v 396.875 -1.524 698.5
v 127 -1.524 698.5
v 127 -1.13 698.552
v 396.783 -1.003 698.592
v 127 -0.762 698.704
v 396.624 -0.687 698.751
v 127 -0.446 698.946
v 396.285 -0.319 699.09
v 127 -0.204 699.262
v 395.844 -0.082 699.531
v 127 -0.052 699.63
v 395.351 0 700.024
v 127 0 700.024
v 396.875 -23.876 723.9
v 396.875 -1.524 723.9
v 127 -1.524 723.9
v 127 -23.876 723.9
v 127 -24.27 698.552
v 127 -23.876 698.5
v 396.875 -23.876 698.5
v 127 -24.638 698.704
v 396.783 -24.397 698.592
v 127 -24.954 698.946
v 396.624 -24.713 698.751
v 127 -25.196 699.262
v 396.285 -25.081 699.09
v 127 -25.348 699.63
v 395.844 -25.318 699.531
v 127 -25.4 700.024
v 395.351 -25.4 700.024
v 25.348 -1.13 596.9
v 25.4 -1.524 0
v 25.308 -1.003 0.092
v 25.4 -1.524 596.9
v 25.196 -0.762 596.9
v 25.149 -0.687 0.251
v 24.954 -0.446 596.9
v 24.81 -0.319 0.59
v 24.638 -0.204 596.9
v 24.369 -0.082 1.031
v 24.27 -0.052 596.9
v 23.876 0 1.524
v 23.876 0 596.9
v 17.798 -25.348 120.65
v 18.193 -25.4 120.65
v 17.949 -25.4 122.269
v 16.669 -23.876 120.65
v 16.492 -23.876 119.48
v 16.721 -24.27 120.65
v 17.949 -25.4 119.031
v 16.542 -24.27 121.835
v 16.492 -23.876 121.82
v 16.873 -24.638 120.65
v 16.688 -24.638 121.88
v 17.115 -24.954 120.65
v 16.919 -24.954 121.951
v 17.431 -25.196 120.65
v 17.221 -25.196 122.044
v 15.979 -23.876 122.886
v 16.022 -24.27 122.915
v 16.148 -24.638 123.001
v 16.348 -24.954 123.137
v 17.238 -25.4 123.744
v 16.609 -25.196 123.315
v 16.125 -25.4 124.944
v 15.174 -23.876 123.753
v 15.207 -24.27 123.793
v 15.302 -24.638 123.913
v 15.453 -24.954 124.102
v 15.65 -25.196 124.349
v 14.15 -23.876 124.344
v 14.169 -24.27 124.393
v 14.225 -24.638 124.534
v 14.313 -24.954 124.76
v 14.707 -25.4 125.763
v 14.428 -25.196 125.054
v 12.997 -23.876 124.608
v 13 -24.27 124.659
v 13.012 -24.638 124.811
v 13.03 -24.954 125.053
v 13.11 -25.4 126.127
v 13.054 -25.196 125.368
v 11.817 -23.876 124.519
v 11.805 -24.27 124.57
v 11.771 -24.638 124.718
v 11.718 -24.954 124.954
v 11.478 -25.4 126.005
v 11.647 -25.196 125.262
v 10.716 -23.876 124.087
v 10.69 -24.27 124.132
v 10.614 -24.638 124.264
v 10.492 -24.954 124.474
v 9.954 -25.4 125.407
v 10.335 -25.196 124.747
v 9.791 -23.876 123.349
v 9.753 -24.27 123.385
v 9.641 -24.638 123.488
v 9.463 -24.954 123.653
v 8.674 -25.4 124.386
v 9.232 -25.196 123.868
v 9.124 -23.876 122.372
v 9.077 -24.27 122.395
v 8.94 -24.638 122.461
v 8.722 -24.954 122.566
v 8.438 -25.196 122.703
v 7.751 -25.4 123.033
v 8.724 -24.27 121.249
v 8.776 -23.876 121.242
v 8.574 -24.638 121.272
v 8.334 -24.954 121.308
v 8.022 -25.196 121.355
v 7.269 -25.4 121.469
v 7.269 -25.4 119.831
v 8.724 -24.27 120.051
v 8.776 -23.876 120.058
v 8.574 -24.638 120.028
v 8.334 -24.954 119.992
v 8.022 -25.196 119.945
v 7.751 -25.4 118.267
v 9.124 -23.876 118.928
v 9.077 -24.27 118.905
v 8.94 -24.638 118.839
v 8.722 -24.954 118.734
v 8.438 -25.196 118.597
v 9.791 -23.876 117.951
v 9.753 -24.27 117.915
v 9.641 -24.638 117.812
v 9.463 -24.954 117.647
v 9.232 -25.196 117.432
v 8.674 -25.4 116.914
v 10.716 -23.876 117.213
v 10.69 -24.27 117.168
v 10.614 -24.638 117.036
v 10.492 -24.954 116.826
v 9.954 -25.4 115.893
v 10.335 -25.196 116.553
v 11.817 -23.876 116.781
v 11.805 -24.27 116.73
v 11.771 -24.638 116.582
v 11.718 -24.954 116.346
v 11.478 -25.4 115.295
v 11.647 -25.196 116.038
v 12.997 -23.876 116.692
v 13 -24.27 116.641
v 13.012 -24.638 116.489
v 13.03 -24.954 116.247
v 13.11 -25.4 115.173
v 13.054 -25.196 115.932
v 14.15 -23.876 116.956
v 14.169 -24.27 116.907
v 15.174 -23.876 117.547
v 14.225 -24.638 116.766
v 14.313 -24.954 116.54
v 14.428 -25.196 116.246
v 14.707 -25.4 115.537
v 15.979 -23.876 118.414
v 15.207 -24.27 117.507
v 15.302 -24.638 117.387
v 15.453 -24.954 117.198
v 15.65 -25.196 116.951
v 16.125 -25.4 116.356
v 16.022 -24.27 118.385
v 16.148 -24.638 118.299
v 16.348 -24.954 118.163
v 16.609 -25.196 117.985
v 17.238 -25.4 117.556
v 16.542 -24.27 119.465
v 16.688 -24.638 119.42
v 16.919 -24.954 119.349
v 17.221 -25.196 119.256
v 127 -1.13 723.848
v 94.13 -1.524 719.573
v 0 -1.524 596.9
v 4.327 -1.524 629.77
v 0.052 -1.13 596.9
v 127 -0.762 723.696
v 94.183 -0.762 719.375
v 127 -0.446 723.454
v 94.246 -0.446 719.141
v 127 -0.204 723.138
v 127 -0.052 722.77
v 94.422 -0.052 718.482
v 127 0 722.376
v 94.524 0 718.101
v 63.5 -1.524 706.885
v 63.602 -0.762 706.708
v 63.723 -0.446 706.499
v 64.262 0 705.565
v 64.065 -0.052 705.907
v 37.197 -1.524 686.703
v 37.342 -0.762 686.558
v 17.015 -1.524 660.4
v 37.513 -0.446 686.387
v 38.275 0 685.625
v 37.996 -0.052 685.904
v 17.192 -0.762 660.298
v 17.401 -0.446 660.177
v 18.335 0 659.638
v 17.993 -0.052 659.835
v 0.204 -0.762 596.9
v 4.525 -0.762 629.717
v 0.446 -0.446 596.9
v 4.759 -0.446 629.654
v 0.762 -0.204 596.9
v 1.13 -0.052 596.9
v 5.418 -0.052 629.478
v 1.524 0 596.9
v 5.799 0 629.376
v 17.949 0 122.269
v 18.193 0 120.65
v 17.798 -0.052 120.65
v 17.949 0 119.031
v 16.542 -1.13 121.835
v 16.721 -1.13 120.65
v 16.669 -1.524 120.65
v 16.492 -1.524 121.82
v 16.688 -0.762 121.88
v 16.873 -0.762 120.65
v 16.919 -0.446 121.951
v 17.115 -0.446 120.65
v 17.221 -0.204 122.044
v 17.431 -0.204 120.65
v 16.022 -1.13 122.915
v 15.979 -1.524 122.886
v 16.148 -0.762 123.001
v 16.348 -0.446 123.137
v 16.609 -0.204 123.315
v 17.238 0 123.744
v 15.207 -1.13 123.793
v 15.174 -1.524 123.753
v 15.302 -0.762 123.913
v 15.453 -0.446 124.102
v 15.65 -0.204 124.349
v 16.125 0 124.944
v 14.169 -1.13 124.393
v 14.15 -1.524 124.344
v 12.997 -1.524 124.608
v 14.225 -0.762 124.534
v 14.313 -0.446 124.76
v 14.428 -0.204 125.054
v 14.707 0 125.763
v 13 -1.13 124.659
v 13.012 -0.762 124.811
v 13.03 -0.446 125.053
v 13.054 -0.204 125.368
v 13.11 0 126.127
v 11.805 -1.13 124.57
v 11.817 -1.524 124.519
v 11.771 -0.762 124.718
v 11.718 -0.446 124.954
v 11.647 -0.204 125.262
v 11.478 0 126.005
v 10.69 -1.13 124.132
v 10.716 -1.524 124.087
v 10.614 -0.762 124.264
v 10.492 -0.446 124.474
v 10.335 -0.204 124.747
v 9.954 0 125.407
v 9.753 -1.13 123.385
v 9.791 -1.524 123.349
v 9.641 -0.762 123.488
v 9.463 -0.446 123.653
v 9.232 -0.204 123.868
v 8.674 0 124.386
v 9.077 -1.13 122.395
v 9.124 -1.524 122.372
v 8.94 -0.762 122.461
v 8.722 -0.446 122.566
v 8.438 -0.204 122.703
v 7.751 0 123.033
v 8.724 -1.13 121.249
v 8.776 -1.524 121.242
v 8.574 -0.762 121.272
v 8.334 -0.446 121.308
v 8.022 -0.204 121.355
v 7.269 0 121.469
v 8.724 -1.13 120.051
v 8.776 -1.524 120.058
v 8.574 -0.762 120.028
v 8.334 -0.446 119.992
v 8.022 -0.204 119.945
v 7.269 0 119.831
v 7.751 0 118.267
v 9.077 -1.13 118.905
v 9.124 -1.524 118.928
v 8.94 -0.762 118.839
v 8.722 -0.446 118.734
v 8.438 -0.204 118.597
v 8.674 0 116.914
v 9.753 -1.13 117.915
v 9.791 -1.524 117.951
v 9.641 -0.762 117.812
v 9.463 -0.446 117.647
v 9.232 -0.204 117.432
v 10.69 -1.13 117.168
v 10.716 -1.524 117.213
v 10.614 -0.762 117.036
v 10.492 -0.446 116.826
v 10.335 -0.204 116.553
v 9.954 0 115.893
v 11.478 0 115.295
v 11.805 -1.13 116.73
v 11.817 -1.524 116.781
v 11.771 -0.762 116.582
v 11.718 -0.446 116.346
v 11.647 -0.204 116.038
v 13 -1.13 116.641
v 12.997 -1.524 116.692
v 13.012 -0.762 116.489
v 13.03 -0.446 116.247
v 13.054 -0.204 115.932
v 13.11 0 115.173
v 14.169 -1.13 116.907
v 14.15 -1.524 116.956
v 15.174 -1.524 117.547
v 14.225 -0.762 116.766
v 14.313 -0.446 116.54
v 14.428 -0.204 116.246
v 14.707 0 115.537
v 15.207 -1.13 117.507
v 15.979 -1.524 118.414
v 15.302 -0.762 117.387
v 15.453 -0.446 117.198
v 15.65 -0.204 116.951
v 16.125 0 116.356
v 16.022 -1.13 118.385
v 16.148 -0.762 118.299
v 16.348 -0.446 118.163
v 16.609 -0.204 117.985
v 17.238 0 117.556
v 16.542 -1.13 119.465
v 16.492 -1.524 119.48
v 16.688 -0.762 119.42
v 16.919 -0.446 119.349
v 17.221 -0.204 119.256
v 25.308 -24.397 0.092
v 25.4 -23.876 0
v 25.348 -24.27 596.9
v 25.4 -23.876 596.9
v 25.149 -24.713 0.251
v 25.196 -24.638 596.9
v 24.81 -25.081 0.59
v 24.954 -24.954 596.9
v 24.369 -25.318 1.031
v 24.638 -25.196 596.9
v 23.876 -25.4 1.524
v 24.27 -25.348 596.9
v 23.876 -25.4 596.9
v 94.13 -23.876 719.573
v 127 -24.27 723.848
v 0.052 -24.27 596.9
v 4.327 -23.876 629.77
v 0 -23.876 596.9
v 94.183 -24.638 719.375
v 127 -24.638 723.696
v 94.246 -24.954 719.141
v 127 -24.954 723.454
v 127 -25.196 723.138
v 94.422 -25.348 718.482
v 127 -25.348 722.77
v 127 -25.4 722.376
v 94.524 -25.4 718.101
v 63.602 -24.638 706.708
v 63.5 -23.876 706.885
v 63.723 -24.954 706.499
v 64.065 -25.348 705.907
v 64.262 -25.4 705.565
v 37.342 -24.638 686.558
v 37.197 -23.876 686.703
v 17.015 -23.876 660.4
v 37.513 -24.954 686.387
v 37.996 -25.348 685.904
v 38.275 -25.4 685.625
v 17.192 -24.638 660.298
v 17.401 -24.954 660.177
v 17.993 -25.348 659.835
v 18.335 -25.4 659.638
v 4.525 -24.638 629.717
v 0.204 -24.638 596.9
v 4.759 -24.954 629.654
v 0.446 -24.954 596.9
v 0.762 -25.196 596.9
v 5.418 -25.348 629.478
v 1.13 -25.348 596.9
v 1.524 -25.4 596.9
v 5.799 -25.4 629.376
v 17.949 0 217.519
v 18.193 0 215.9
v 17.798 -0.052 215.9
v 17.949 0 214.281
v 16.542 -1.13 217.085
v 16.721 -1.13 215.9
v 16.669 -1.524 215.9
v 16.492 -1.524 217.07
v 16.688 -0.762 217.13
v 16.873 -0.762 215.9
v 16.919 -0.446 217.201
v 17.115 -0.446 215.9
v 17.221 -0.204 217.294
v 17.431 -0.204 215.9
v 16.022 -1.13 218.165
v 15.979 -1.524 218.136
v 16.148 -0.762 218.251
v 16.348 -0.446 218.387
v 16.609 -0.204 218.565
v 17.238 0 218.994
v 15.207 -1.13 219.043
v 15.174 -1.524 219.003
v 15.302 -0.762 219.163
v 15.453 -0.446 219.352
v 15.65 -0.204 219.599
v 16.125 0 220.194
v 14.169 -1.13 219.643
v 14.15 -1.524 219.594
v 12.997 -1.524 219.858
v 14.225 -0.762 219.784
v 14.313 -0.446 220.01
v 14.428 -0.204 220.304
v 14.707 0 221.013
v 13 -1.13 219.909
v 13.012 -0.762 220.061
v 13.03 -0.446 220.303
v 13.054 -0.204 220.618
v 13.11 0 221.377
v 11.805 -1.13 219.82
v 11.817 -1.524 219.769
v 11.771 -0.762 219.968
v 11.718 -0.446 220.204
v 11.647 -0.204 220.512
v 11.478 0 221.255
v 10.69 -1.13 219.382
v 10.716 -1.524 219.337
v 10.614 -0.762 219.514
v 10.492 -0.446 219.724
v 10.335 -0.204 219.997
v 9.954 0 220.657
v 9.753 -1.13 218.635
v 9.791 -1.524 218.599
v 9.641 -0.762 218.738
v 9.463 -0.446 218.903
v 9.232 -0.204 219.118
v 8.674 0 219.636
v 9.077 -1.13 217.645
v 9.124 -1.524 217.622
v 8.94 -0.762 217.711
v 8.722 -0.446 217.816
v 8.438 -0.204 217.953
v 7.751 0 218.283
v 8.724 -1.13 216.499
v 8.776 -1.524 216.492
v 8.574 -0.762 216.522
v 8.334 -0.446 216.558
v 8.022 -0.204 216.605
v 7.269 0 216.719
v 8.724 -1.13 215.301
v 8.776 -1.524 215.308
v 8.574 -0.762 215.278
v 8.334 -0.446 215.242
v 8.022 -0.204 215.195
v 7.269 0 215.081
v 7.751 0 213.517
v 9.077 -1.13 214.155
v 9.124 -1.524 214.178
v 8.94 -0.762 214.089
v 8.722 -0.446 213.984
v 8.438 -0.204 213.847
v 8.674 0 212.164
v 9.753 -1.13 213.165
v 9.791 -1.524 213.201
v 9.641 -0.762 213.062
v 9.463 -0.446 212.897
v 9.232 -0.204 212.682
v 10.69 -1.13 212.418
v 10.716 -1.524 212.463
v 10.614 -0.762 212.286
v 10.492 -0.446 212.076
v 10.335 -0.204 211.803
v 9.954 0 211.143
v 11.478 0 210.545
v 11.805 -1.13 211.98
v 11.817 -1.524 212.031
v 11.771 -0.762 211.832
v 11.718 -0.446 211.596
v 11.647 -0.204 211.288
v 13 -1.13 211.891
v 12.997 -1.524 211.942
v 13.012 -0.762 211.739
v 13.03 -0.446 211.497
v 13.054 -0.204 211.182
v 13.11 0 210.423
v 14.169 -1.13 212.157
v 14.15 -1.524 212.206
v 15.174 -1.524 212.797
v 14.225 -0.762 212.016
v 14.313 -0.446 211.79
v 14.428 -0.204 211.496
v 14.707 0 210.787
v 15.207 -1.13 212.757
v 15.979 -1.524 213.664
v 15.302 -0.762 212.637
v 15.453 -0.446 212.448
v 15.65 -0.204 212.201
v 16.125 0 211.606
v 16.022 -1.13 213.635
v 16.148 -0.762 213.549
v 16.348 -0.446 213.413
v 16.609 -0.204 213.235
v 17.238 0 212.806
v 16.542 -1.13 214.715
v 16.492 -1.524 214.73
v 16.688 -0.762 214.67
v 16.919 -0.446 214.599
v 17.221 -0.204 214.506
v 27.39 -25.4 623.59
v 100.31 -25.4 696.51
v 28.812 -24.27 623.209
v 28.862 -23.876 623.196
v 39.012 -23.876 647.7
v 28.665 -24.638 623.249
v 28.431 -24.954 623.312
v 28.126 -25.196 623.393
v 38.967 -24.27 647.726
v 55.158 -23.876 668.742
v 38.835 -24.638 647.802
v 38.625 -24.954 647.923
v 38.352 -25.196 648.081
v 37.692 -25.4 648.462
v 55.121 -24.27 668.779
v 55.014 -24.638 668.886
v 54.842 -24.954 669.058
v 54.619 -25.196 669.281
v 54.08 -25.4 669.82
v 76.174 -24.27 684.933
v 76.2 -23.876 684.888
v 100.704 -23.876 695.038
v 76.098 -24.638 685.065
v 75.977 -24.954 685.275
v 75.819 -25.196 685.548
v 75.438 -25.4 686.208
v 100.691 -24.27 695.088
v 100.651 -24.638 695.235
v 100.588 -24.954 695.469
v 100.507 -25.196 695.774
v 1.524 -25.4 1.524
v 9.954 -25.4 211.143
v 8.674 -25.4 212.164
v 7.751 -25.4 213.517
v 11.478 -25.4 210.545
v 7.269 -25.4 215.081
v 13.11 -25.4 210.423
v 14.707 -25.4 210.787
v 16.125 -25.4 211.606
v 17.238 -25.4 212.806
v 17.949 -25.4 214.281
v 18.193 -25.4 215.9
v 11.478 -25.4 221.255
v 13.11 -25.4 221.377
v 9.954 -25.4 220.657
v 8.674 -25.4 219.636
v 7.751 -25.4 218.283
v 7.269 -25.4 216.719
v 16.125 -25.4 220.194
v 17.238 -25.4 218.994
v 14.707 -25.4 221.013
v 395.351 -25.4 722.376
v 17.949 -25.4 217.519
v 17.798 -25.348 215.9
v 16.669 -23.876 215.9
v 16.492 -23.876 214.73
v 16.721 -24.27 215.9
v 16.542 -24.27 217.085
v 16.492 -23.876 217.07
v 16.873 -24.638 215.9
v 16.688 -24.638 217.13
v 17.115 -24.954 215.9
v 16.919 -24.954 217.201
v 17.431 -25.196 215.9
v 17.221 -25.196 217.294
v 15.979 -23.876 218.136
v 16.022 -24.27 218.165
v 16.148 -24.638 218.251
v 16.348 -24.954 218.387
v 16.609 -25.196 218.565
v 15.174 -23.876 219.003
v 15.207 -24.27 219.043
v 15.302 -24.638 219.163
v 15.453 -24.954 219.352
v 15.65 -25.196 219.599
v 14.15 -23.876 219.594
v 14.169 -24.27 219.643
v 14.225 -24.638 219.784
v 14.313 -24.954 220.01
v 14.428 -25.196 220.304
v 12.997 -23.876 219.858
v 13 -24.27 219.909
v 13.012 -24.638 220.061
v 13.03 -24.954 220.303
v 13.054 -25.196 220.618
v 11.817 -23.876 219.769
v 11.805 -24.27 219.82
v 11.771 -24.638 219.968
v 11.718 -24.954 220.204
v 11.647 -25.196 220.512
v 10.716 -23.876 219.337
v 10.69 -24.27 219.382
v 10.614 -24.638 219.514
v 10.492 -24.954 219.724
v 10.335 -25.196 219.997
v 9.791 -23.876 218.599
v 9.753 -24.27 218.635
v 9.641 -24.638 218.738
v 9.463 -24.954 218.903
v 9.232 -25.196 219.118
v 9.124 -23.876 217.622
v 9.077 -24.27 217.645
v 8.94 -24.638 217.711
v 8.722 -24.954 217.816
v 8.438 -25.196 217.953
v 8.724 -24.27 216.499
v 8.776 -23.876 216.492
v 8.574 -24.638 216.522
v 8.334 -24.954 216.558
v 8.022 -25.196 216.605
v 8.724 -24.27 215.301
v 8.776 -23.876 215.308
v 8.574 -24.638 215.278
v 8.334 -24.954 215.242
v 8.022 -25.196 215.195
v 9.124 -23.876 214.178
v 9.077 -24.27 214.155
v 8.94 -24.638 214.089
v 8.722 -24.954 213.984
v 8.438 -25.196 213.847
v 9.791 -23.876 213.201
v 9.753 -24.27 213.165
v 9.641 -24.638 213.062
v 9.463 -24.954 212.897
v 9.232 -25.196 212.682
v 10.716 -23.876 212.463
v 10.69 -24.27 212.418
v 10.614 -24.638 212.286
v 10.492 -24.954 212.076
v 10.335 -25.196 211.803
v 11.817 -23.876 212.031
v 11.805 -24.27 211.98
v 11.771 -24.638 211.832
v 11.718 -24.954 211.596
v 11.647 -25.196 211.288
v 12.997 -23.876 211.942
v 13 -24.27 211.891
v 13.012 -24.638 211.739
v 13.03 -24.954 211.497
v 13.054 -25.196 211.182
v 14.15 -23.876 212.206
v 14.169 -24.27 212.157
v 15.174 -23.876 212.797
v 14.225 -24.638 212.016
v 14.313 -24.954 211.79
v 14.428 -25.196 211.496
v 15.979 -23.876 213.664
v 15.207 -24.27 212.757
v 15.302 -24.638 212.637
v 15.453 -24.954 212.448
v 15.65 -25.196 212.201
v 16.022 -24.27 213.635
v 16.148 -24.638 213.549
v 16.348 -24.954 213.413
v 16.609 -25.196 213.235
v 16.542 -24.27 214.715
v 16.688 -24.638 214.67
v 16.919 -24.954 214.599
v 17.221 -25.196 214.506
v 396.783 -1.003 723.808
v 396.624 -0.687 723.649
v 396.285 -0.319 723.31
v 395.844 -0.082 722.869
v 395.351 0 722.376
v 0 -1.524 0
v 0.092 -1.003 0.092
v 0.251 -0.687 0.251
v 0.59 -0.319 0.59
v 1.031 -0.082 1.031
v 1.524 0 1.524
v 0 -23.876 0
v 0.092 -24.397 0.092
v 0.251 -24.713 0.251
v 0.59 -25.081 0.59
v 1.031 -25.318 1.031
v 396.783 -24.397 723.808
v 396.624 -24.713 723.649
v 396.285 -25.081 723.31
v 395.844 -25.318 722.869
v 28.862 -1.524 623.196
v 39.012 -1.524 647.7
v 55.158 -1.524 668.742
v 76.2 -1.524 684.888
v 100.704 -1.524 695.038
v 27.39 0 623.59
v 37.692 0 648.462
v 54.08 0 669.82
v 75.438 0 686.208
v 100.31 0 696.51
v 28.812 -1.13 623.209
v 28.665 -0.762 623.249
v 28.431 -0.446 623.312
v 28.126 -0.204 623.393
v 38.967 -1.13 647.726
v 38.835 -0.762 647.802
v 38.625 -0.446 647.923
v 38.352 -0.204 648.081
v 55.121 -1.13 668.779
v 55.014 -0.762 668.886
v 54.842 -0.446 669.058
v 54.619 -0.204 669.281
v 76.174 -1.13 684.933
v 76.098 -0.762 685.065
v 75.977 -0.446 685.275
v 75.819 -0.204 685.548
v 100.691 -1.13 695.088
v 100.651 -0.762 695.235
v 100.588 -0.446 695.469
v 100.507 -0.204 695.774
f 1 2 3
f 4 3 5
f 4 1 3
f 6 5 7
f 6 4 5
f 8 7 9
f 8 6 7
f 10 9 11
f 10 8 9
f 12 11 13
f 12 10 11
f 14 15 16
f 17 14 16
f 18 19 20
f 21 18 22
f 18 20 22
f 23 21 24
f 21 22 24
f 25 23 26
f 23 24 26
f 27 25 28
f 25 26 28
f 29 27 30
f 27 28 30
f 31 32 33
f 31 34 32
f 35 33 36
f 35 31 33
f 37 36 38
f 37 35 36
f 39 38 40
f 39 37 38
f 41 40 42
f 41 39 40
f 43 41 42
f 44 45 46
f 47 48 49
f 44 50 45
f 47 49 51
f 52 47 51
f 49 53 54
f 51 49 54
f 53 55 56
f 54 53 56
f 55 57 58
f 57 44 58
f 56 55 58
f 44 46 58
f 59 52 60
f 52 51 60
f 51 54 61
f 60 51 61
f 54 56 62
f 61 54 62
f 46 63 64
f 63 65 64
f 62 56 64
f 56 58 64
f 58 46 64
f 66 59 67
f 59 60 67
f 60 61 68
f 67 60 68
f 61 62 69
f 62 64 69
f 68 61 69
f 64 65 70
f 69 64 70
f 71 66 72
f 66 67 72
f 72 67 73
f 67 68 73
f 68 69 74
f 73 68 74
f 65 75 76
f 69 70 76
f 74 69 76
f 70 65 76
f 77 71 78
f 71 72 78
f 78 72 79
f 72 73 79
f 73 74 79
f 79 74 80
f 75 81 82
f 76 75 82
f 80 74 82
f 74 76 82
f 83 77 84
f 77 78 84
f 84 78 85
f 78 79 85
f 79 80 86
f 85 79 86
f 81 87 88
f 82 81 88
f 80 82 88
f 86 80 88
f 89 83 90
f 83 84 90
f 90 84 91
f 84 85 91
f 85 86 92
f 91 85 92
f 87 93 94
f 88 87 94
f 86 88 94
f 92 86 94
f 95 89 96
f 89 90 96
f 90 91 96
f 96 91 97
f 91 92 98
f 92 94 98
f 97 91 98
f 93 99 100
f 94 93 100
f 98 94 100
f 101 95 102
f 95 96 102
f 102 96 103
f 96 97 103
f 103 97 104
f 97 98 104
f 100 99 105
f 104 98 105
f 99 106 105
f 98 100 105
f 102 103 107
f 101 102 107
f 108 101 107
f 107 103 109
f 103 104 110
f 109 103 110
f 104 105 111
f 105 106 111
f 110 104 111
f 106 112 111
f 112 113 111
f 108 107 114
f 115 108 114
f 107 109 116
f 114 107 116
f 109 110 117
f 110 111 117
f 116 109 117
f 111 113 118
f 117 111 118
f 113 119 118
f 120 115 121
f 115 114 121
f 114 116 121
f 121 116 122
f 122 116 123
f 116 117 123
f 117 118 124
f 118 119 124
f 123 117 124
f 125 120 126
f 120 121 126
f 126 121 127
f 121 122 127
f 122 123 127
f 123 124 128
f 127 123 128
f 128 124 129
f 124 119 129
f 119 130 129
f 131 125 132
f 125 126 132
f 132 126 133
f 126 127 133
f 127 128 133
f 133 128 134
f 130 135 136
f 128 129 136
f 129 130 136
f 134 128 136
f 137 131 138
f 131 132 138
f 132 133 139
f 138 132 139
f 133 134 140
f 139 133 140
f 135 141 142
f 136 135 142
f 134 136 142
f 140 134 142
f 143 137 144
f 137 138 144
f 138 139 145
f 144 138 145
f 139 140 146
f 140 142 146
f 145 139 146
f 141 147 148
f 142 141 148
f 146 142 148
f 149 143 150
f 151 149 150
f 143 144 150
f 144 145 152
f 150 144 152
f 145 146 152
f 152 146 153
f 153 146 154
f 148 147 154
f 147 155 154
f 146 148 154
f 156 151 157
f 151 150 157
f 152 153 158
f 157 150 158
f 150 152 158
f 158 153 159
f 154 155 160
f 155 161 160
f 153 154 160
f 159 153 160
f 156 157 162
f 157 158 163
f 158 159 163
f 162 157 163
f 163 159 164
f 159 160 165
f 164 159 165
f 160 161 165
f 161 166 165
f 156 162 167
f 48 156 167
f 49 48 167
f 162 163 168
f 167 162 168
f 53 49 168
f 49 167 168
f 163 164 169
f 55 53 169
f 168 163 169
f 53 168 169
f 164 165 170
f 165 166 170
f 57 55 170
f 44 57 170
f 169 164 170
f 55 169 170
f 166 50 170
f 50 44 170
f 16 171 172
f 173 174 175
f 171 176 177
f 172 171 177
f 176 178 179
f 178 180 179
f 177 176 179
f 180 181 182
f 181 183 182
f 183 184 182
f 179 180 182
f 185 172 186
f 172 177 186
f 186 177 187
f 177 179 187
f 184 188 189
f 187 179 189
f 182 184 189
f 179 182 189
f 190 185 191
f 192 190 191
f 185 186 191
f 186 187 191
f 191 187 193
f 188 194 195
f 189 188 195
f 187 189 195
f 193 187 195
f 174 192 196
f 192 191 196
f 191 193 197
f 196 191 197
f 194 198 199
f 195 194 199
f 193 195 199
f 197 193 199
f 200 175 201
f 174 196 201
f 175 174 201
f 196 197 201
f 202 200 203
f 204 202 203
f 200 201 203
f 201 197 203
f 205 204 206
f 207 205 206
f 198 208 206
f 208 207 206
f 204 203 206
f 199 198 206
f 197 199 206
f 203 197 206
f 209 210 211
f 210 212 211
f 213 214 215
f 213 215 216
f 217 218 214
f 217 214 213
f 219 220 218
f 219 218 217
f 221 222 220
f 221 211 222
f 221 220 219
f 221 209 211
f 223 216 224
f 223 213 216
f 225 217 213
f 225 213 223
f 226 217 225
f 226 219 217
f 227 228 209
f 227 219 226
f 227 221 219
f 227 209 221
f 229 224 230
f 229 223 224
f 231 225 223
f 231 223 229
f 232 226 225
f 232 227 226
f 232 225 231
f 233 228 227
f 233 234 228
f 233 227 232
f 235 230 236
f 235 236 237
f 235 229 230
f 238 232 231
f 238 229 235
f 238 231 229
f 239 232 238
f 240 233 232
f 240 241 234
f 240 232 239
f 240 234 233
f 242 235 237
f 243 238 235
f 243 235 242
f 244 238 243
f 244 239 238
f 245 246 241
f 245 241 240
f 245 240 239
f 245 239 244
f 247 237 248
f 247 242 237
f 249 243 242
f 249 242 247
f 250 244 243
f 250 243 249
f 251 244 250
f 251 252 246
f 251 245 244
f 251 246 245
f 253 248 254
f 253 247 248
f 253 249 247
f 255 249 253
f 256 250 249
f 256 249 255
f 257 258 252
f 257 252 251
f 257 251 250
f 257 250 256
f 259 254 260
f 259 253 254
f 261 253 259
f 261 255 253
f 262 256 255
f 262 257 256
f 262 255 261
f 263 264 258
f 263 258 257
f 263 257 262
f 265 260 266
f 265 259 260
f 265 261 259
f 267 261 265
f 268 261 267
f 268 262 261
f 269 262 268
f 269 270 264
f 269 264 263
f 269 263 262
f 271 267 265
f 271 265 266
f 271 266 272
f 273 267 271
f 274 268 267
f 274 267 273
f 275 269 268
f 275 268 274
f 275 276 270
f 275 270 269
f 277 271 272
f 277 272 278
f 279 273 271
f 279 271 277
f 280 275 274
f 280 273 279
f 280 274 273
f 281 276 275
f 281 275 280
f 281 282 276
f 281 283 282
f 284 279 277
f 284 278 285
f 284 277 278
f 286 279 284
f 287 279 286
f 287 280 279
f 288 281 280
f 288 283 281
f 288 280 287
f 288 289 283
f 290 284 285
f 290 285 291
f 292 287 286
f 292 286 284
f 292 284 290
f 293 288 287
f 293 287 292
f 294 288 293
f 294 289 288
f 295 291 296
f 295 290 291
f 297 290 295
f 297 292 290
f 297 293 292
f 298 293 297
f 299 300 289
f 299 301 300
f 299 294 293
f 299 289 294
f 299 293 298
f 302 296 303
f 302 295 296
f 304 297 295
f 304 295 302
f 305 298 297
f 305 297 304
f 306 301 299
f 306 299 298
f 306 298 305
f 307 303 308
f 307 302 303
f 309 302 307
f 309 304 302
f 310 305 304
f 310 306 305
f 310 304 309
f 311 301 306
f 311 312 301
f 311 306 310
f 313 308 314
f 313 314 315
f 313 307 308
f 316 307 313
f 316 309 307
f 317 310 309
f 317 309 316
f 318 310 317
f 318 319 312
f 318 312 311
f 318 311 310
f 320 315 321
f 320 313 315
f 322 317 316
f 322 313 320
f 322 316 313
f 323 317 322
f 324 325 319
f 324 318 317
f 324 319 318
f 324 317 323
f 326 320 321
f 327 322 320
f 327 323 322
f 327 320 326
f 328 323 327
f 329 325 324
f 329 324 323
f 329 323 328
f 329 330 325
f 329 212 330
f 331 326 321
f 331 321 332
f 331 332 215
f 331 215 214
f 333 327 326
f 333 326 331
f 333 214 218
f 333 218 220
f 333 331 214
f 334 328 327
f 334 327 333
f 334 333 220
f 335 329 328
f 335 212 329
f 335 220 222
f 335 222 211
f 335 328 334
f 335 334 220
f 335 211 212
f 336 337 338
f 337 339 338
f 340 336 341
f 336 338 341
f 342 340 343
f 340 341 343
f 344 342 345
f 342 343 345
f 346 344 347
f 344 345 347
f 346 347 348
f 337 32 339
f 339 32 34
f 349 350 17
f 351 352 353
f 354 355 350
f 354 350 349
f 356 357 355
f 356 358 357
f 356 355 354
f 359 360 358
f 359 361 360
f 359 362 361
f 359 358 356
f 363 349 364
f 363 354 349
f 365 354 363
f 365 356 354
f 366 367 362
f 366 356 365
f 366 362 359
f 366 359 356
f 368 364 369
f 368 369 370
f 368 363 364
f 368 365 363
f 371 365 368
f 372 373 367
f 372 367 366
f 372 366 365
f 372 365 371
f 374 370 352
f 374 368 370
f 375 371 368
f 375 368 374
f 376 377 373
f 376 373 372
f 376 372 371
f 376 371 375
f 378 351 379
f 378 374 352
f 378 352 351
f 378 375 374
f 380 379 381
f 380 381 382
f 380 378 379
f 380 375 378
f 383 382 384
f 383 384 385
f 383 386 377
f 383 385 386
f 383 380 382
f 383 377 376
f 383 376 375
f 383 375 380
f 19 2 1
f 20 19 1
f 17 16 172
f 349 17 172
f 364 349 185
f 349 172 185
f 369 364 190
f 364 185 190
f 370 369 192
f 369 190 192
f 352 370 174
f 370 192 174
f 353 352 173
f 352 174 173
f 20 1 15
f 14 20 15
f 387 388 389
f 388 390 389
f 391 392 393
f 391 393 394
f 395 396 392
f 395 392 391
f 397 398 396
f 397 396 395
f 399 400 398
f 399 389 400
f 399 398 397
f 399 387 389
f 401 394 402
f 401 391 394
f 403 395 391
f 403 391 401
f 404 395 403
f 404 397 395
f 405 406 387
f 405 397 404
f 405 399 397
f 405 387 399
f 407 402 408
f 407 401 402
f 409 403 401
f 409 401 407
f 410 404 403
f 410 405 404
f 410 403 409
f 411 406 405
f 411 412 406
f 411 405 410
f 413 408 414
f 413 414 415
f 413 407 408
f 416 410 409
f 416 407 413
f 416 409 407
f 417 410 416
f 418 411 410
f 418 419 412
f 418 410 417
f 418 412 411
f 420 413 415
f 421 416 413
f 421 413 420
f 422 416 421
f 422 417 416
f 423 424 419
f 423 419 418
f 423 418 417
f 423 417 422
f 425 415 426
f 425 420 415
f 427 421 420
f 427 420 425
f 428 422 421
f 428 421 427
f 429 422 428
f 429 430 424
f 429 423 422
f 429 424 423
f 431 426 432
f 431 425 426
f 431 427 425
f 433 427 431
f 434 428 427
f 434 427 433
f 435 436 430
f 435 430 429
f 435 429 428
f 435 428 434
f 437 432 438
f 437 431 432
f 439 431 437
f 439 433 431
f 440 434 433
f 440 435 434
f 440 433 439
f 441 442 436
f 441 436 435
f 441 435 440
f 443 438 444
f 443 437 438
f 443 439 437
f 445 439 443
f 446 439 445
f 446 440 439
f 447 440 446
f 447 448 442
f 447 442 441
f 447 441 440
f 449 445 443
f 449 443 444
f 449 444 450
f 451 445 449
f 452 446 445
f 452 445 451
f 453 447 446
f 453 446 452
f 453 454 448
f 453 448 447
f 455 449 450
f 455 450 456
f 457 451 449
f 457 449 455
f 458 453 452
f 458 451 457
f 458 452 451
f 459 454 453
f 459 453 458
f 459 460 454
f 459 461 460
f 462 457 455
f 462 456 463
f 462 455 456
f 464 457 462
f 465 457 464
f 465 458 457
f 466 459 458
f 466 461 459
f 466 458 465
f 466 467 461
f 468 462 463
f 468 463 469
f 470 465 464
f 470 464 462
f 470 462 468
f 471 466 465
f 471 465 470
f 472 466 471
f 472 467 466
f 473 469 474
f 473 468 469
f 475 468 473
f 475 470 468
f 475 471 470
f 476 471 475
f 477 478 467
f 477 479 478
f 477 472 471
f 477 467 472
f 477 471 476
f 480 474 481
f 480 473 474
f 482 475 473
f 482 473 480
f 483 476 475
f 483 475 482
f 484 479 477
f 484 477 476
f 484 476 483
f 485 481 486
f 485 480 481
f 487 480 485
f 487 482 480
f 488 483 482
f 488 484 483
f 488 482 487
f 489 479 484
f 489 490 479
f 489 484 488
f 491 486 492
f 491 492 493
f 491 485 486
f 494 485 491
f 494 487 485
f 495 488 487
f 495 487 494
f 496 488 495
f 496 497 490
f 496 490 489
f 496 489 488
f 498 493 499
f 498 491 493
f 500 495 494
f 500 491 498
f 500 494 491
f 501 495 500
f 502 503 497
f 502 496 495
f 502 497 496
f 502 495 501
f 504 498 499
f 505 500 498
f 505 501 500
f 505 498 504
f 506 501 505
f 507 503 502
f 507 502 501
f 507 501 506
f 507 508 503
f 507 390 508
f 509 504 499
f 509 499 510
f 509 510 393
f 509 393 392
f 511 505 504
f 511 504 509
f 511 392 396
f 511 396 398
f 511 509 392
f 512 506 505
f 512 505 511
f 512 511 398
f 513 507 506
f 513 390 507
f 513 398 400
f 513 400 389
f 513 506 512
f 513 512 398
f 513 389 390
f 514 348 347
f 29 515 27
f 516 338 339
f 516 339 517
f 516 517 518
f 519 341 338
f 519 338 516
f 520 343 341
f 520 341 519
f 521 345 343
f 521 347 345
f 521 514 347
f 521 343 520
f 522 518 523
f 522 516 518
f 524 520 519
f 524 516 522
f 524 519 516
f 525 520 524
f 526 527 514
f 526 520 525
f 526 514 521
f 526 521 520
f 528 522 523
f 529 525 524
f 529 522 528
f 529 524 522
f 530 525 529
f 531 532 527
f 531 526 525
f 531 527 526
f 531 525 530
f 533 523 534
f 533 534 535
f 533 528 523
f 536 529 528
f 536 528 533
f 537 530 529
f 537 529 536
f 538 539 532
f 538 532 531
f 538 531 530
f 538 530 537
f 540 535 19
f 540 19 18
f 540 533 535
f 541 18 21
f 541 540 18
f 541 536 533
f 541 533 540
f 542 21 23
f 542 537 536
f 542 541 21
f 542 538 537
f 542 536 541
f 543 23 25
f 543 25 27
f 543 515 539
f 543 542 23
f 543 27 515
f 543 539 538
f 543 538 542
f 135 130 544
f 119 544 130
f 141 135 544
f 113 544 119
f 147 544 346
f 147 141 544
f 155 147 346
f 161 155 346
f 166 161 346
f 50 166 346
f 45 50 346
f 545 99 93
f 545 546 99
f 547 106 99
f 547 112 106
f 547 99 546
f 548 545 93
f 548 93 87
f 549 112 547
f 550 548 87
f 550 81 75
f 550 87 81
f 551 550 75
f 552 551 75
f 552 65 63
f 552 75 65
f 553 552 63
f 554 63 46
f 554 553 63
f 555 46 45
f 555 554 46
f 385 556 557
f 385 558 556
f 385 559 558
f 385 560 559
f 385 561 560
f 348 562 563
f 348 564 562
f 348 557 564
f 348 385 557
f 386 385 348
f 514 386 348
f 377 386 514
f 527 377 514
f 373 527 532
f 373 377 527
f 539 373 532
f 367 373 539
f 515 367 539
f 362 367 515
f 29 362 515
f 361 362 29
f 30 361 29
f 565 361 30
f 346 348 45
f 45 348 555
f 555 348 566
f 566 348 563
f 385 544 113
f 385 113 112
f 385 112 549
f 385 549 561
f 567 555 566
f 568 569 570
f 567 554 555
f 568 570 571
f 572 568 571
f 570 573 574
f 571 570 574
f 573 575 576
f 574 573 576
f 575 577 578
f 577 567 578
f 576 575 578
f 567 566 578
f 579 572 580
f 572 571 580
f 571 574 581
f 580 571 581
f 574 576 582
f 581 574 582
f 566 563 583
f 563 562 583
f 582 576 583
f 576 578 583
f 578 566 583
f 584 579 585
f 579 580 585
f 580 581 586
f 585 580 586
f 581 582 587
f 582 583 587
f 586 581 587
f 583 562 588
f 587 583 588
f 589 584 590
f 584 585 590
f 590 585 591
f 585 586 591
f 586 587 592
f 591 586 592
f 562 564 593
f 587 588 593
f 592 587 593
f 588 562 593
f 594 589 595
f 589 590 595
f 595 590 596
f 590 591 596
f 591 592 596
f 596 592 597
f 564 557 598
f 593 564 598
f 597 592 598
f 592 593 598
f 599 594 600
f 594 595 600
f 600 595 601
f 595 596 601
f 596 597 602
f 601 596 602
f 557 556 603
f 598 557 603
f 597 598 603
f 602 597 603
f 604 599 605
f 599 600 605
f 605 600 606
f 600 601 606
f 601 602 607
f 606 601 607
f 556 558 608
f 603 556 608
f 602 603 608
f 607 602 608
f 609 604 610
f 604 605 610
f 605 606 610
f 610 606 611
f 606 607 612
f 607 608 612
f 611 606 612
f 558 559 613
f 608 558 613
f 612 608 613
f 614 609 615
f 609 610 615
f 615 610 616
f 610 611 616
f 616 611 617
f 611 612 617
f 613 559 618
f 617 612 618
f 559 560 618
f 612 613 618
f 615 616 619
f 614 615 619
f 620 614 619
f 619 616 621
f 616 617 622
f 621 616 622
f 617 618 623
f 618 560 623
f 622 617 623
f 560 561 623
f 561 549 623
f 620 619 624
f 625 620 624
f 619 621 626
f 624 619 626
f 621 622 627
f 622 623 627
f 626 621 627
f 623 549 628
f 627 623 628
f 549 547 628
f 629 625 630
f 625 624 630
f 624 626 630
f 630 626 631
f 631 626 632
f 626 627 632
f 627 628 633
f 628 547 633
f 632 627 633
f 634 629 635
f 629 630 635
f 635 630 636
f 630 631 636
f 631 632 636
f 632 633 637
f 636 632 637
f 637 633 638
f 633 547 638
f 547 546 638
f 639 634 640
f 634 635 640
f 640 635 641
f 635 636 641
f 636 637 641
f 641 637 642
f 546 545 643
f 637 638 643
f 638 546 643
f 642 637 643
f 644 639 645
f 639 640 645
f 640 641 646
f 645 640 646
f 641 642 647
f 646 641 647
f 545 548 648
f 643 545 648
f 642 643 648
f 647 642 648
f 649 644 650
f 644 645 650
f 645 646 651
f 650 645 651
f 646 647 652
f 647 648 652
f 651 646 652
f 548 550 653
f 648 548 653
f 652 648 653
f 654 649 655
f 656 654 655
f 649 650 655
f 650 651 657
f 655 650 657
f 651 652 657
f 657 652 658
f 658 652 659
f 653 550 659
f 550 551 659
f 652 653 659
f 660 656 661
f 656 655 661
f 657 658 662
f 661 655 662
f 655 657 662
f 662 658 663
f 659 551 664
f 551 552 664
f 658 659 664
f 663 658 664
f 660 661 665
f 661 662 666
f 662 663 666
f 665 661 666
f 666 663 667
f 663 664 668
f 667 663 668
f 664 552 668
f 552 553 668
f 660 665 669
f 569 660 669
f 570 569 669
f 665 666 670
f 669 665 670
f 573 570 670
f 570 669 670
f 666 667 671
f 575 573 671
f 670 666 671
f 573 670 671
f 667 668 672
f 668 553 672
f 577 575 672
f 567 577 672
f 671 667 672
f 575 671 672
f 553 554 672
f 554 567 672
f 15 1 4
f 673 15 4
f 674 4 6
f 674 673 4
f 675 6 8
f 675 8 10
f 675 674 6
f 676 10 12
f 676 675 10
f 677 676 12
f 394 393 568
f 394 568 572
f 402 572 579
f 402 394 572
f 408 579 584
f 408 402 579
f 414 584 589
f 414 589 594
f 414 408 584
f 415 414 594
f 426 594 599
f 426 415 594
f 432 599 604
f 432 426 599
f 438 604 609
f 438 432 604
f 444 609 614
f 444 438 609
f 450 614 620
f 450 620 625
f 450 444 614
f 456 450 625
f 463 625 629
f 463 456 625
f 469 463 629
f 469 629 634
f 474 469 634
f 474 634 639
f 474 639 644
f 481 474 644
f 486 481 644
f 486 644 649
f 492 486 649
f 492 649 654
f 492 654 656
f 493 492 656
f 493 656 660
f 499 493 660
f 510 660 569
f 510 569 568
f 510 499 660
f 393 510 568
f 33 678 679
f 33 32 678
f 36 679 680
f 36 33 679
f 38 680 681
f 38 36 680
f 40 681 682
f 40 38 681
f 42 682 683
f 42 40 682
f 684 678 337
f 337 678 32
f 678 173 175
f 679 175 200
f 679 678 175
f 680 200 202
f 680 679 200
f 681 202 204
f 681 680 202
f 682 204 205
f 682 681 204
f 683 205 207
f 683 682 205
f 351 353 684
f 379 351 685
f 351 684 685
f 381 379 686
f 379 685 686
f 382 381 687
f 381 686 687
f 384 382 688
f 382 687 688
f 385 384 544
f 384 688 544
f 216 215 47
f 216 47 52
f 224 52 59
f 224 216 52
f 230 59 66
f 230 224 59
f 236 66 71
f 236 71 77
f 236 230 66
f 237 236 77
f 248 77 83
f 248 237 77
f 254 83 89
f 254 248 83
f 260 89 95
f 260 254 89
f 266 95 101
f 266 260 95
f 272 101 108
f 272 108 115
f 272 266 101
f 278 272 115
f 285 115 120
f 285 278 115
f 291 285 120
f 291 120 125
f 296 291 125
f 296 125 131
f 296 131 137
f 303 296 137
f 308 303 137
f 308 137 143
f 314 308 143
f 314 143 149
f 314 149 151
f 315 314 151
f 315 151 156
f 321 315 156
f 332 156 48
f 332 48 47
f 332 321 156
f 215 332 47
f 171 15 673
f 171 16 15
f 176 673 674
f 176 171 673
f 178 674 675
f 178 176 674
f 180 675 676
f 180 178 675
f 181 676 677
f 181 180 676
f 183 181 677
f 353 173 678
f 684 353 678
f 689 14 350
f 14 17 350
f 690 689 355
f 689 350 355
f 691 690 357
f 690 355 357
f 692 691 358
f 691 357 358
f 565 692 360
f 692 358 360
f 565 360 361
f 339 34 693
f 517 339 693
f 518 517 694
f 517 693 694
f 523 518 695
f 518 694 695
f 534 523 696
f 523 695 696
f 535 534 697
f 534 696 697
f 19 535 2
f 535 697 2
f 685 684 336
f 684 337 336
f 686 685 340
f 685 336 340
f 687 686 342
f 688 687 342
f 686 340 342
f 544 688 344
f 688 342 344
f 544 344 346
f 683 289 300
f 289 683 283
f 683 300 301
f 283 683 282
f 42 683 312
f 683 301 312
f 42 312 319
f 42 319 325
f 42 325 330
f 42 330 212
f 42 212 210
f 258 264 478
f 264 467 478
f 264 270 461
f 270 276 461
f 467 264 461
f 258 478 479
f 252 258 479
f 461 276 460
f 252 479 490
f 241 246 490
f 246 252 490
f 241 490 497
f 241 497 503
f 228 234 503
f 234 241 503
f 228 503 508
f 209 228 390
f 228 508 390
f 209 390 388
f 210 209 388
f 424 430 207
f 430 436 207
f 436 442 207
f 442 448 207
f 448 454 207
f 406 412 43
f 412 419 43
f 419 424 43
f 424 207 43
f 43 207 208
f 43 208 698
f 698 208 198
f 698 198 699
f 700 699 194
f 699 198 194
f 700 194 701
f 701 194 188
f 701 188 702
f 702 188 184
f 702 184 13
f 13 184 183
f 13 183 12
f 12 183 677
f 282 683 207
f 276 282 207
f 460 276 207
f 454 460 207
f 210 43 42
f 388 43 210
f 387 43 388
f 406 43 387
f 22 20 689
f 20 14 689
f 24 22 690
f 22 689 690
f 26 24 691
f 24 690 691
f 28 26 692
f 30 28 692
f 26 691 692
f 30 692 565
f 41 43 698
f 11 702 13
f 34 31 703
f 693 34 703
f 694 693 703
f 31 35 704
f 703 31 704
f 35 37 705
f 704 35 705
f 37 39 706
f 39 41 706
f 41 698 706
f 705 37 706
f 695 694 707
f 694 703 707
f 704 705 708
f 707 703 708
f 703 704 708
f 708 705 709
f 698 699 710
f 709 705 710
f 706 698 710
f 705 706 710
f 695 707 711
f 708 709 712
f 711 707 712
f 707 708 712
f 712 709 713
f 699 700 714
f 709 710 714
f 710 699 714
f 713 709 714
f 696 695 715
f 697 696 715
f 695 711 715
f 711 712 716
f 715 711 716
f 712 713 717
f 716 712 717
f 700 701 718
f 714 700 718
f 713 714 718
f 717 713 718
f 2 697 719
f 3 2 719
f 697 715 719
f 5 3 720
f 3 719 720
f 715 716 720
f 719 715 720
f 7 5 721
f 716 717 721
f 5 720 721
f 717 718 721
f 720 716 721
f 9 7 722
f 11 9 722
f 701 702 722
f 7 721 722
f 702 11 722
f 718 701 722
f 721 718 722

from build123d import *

# Parameters (mm, degrees)
F0_R     = 3.96875
F1_DEPTH = 25.4
F2_R     = 1.524


with BuildPart() as f1:
    # F0 (on Front) → F1 (new body)
    with BuildSketch(Plane.XZ):
        with BuildLine():
            Line((0, 596.9), (0, 0))
            Line((0, 0), (25.4, 0))
            Line((25.4, 0), (25.4, 596.9))
            ThreePointArc((25.4, 596.9), (55.157951, 668.742049), (127, 698.5))
            Line((127, 698.5), (396.875, 698.5))
            Line((396.875, 698.5), (396.875, 723.9))
            Line((396.875, 723.9), (127, 723.9))
            ThreePointArc((127, 723.9), (37.197439, 686.702561), (0, 596.9))
        make_face()
        with Locations((12.7, 120.65)):
            Circle(F0_R, mode=Mode.SUBTRACT)
        with Locations((12.7, 215.9)):
            Circle(F0_R, mode=Mode.SUBTRACT)
    extrude(amount=F1_DEPTH)

    # F2
    f2_edges = [f1.edges().sort_by_distance(p)[0] for p in [
        (25.4, -25.4, 298.45),
        (0, -25.4, 298.45),
        (0, 0, 298.45),
        (25.4, 0, 298.45),
        (12.7, 0, 0),
        (55.157951, 0, 668.742049),
        (261.9375, 0, 698.5),
        (396.875, 0, 711.2),
        (261.9375, 0, 723.9),
        (37.197439, 0, 686.702561),
        (8.73125, 0, 120.65),
        (8.73125, 0, 215.9),
        (12.7, -25.4, 0),
        (55.157951, -25.4, 668.742049),
        (261.9375, -25.4, 698.5),
        (396.875, -25.4, 711.2),
        (261.9375, -25.4, 723.9),
        (37.197439, -25.4, 686.702561),
        (8.73125, -25.4, 120.65),
        (8.73125, -25.4, 215.9),
    ]]
    fillet(f2_edges, radius=F2_R)


solid = f1.part
